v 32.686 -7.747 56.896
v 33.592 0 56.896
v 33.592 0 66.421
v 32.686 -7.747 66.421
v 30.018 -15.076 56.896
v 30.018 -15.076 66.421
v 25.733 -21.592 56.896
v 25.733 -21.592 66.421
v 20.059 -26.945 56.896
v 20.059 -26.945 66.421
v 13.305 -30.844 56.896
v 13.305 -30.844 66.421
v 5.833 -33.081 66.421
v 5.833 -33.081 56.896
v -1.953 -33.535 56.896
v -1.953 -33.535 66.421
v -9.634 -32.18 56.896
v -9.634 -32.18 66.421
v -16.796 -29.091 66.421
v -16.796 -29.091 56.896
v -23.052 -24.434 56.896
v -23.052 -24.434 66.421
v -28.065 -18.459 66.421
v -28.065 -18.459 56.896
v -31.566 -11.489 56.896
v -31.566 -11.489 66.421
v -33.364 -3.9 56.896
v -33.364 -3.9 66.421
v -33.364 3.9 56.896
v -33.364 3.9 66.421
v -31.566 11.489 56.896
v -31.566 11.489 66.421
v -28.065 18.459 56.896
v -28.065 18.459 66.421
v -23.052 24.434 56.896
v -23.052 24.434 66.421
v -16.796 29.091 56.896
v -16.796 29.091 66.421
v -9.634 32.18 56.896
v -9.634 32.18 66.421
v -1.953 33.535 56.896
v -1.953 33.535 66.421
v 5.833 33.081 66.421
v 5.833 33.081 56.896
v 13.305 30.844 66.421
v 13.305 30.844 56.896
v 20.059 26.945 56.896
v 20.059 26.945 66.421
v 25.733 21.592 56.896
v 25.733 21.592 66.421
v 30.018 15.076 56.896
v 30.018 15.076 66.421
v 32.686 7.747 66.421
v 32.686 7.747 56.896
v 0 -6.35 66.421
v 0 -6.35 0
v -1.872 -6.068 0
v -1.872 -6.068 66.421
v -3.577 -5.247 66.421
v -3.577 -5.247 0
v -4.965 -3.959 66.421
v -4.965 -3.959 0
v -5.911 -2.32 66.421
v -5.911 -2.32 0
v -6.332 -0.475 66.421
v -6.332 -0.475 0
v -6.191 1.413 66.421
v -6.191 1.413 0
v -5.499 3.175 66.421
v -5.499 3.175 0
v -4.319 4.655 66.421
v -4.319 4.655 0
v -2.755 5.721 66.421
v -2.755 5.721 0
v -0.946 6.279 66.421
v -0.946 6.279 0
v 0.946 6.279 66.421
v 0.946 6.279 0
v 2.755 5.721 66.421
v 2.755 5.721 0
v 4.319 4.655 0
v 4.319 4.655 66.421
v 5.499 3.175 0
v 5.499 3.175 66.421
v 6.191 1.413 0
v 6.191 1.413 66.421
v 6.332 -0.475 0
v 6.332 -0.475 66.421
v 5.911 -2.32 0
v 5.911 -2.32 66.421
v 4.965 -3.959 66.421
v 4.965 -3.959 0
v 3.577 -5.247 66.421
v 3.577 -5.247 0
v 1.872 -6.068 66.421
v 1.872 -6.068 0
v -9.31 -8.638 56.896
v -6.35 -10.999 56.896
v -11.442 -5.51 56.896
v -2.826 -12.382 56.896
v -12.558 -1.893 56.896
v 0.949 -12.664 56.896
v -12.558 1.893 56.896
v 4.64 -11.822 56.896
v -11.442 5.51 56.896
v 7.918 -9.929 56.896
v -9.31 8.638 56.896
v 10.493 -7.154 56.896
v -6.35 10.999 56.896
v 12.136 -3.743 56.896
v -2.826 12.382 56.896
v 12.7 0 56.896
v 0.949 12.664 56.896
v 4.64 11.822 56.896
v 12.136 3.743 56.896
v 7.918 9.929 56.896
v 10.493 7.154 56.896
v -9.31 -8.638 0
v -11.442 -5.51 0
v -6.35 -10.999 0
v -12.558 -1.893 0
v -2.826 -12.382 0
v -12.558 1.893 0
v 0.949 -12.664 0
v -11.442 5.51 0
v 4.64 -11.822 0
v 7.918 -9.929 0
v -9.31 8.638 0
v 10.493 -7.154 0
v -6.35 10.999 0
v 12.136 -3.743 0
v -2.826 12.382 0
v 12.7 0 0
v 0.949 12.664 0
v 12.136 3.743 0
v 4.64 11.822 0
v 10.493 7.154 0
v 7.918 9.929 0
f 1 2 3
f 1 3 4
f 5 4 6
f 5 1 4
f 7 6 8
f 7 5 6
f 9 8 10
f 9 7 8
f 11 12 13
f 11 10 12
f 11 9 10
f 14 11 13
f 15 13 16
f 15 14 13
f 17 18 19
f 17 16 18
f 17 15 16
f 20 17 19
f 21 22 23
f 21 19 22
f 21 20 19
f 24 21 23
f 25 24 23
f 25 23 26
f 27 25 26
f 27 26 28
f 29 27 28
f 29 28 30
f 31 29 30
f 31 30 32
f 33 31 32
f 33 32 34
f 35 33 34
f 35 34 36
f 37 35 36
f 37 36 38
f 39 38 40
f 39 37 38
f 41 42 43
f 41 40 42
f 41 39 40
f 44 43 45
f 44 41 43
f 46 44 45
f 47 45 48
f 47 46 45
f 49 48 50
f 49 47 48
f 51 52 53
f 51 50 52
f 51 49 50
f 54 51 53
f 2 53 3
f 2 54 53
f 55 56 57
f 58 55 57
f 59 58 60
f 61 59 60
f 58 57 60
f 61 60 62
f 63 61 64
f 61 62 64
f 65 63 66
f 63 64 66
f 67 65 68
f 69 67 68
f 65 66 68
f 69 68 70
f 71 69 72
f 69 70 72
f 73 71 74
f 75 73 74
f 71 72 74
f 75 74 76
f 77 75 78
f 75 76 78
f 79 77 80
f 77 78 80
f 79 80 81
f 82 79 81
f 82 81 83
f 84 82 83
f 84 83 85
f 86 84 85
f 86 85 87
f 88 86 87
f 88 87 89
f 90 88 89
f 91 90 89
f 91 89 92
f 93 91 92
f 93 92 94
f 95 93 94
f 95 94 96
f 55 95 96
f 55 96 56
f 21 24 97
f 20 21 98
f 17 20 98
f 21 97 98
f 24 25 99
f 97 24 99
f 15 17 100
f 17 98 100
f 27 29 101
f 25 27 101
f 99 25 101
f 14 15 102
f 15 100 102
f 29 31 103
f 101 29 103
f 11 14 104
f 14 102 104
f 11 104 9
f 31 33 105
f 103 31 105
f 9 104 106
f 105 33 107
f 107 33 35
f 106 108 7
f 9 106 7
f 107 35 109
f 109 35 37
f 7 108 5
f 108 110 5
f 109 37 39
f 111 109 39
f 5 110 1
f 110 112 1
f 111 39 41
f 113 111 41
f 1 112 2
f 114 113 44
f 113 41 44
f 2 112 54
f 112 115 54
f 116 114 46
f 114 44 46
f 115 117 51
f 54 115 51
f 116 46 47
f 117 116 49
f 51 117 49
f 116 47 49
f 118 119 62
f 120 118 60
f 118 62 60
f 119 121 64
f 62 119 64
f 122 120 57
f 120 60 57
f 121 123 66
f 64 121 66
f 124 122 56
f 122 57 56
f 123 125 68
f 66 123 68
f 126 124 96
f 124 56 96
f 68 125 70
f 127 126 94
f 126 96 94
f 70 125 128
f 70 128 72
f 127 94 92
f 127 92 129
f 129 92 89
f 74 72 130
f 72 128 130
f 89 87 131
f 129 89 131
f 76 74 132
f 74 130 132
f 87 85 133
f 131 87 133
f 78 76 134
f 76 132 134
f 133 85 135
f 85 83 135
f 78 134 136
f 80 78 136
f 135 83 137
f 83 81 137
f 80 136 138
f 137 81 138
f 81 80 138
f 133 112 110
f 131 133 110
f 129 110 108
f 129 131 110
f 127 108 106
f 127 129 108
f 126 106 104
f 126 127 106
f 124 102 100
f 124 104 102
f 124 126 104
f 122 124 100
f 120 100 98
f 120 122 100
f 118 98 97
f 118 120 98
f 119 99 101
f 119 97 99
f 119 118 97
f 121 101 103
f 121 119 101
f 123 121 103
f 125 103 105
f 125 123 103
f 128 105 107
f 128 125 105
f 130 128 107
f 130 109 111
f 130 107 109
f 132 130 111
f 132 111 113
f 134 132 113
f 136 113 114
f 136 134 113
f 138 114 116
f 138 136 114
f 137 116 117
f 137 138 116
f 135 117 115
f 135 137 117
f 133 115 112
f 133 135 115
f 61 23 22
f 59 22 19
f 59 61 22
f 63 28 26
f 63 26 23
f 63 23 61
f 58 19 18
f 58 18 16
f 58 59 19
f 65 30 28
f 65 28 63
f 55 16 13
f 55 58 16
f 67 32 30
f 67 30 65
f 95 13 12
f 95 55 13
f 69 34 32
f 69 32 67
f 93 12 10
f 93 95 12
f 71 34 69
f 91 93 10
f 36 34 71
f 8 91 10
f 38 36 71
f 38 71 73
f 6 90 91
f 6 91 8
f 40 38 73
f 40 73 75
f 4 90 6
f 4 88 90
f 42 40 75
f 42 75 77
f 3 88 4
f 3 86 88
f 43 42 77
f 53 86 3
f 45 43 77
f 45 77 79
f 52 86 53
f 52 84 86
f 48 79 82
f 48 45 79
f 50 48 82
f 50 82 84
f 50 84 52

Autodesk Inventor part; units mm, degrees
ref_plane "YZ Plane" through (0, 0, 0) normal (1, 0, 0) x (0, 1, 0)
ref_plane "XZ Plane" through (0, 0, 0) normal (0, 1, 0) x (-1, 0, 0)
ref_plane "XY Plane" through (0, 0, 0) normal (0, 0, 1) x (1, 0, 0)
sketch "Sketch1" plane through (0, 0, 0) normal (0, 0, 1) x (1, 0, 0)
  circle A0 centre (0, 0) radius 12.7
  dimension "d0" = 25.4
extrude "Extrusion1" add sketch "Sketch1" along normal blind 56.896
sketch "Sketch2" plane through (0, 0, 56.896) normal (0, 0, 1) x (1, 0, 0)
  circle A0 centre (0, 0) radius 6.35
  dimension "d4" = 12.7
hole "Hole1" at (0, 0, 56.896) direction (0, 0, -1) diameter 12.7 end through all
sketch "Sketch5" plane through (0, 0, 56.896) normal (0, 0, 1) x (1, 0, 0)
  circle A0 centre (0, 0) radius 33.5915
  dimension "d12" = 67.183
extrude "Extrusion2" add sketch "Sketch5" along normal blind 9.525
sketch "Sketch6" plane through (0, 0, 66.421) normal (0, 0, 1) x (1, 0, 0)
  circle A0 centre (0, 0) radius 6.35
hole "Hole2" at (0, 0, 66.421) direction (0, 0, -1) diameter 12.7 end through all
properties part number "SubSprocketNoTeeth"
